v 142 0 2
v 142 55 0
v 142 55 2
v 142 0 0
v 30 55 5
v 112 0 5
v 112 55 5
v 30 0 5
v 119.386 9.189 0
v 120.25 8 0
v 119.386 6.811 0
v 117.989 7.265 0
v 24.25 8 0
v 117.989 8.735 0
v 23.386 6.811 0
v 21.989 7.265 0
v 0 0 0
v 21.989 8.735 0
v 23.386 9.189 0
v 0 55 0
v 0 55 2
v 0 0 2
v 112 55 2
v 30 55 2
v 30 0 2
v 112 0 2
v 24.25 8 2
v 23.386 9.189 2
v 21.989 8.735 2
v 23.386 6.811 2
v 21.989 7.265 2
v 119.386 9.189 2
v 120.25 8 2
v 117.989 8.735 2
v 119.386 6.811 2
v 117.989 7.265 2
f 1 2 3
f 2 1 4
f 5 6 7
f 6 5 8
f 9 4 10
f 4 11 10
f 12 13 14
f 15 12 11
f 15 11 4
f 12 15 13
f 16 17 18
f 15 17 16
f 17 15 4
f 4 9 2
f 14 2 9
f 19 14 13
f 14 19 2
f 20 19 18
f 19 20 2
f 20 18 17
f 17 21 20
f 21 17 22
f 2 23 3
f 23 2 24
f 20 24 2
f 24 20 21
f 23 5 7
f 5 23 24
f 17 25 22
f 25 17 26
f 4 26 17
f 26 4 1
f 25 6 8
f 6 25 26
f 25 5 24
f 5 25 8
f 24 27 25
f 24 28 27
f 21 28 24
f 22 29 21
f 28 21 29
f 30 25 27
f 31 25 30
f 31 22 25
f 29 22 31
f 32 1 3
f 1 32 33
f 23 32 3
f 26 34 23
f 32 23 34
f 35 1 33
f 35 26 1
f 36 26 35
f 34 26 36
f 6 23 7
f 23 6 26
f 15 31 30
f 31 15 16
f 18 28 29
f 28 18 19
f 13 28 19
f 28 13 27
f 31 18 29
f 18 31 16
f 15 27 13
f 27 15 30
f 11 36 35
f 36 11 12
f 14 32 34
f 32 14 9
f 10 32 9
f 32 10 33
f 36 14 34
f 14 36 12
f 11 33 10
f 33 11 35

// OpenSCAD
difference(){
cube([142,55,5]);
translate([0,0,2])cube([30,55,5]);
translate([112,0,2])cube([30,55,5]);
translate([23,8,-10])
cylinder(d=2.5,h=20);
translate([119,8,-10])
cylinder(d=2.5,h=20);
}
